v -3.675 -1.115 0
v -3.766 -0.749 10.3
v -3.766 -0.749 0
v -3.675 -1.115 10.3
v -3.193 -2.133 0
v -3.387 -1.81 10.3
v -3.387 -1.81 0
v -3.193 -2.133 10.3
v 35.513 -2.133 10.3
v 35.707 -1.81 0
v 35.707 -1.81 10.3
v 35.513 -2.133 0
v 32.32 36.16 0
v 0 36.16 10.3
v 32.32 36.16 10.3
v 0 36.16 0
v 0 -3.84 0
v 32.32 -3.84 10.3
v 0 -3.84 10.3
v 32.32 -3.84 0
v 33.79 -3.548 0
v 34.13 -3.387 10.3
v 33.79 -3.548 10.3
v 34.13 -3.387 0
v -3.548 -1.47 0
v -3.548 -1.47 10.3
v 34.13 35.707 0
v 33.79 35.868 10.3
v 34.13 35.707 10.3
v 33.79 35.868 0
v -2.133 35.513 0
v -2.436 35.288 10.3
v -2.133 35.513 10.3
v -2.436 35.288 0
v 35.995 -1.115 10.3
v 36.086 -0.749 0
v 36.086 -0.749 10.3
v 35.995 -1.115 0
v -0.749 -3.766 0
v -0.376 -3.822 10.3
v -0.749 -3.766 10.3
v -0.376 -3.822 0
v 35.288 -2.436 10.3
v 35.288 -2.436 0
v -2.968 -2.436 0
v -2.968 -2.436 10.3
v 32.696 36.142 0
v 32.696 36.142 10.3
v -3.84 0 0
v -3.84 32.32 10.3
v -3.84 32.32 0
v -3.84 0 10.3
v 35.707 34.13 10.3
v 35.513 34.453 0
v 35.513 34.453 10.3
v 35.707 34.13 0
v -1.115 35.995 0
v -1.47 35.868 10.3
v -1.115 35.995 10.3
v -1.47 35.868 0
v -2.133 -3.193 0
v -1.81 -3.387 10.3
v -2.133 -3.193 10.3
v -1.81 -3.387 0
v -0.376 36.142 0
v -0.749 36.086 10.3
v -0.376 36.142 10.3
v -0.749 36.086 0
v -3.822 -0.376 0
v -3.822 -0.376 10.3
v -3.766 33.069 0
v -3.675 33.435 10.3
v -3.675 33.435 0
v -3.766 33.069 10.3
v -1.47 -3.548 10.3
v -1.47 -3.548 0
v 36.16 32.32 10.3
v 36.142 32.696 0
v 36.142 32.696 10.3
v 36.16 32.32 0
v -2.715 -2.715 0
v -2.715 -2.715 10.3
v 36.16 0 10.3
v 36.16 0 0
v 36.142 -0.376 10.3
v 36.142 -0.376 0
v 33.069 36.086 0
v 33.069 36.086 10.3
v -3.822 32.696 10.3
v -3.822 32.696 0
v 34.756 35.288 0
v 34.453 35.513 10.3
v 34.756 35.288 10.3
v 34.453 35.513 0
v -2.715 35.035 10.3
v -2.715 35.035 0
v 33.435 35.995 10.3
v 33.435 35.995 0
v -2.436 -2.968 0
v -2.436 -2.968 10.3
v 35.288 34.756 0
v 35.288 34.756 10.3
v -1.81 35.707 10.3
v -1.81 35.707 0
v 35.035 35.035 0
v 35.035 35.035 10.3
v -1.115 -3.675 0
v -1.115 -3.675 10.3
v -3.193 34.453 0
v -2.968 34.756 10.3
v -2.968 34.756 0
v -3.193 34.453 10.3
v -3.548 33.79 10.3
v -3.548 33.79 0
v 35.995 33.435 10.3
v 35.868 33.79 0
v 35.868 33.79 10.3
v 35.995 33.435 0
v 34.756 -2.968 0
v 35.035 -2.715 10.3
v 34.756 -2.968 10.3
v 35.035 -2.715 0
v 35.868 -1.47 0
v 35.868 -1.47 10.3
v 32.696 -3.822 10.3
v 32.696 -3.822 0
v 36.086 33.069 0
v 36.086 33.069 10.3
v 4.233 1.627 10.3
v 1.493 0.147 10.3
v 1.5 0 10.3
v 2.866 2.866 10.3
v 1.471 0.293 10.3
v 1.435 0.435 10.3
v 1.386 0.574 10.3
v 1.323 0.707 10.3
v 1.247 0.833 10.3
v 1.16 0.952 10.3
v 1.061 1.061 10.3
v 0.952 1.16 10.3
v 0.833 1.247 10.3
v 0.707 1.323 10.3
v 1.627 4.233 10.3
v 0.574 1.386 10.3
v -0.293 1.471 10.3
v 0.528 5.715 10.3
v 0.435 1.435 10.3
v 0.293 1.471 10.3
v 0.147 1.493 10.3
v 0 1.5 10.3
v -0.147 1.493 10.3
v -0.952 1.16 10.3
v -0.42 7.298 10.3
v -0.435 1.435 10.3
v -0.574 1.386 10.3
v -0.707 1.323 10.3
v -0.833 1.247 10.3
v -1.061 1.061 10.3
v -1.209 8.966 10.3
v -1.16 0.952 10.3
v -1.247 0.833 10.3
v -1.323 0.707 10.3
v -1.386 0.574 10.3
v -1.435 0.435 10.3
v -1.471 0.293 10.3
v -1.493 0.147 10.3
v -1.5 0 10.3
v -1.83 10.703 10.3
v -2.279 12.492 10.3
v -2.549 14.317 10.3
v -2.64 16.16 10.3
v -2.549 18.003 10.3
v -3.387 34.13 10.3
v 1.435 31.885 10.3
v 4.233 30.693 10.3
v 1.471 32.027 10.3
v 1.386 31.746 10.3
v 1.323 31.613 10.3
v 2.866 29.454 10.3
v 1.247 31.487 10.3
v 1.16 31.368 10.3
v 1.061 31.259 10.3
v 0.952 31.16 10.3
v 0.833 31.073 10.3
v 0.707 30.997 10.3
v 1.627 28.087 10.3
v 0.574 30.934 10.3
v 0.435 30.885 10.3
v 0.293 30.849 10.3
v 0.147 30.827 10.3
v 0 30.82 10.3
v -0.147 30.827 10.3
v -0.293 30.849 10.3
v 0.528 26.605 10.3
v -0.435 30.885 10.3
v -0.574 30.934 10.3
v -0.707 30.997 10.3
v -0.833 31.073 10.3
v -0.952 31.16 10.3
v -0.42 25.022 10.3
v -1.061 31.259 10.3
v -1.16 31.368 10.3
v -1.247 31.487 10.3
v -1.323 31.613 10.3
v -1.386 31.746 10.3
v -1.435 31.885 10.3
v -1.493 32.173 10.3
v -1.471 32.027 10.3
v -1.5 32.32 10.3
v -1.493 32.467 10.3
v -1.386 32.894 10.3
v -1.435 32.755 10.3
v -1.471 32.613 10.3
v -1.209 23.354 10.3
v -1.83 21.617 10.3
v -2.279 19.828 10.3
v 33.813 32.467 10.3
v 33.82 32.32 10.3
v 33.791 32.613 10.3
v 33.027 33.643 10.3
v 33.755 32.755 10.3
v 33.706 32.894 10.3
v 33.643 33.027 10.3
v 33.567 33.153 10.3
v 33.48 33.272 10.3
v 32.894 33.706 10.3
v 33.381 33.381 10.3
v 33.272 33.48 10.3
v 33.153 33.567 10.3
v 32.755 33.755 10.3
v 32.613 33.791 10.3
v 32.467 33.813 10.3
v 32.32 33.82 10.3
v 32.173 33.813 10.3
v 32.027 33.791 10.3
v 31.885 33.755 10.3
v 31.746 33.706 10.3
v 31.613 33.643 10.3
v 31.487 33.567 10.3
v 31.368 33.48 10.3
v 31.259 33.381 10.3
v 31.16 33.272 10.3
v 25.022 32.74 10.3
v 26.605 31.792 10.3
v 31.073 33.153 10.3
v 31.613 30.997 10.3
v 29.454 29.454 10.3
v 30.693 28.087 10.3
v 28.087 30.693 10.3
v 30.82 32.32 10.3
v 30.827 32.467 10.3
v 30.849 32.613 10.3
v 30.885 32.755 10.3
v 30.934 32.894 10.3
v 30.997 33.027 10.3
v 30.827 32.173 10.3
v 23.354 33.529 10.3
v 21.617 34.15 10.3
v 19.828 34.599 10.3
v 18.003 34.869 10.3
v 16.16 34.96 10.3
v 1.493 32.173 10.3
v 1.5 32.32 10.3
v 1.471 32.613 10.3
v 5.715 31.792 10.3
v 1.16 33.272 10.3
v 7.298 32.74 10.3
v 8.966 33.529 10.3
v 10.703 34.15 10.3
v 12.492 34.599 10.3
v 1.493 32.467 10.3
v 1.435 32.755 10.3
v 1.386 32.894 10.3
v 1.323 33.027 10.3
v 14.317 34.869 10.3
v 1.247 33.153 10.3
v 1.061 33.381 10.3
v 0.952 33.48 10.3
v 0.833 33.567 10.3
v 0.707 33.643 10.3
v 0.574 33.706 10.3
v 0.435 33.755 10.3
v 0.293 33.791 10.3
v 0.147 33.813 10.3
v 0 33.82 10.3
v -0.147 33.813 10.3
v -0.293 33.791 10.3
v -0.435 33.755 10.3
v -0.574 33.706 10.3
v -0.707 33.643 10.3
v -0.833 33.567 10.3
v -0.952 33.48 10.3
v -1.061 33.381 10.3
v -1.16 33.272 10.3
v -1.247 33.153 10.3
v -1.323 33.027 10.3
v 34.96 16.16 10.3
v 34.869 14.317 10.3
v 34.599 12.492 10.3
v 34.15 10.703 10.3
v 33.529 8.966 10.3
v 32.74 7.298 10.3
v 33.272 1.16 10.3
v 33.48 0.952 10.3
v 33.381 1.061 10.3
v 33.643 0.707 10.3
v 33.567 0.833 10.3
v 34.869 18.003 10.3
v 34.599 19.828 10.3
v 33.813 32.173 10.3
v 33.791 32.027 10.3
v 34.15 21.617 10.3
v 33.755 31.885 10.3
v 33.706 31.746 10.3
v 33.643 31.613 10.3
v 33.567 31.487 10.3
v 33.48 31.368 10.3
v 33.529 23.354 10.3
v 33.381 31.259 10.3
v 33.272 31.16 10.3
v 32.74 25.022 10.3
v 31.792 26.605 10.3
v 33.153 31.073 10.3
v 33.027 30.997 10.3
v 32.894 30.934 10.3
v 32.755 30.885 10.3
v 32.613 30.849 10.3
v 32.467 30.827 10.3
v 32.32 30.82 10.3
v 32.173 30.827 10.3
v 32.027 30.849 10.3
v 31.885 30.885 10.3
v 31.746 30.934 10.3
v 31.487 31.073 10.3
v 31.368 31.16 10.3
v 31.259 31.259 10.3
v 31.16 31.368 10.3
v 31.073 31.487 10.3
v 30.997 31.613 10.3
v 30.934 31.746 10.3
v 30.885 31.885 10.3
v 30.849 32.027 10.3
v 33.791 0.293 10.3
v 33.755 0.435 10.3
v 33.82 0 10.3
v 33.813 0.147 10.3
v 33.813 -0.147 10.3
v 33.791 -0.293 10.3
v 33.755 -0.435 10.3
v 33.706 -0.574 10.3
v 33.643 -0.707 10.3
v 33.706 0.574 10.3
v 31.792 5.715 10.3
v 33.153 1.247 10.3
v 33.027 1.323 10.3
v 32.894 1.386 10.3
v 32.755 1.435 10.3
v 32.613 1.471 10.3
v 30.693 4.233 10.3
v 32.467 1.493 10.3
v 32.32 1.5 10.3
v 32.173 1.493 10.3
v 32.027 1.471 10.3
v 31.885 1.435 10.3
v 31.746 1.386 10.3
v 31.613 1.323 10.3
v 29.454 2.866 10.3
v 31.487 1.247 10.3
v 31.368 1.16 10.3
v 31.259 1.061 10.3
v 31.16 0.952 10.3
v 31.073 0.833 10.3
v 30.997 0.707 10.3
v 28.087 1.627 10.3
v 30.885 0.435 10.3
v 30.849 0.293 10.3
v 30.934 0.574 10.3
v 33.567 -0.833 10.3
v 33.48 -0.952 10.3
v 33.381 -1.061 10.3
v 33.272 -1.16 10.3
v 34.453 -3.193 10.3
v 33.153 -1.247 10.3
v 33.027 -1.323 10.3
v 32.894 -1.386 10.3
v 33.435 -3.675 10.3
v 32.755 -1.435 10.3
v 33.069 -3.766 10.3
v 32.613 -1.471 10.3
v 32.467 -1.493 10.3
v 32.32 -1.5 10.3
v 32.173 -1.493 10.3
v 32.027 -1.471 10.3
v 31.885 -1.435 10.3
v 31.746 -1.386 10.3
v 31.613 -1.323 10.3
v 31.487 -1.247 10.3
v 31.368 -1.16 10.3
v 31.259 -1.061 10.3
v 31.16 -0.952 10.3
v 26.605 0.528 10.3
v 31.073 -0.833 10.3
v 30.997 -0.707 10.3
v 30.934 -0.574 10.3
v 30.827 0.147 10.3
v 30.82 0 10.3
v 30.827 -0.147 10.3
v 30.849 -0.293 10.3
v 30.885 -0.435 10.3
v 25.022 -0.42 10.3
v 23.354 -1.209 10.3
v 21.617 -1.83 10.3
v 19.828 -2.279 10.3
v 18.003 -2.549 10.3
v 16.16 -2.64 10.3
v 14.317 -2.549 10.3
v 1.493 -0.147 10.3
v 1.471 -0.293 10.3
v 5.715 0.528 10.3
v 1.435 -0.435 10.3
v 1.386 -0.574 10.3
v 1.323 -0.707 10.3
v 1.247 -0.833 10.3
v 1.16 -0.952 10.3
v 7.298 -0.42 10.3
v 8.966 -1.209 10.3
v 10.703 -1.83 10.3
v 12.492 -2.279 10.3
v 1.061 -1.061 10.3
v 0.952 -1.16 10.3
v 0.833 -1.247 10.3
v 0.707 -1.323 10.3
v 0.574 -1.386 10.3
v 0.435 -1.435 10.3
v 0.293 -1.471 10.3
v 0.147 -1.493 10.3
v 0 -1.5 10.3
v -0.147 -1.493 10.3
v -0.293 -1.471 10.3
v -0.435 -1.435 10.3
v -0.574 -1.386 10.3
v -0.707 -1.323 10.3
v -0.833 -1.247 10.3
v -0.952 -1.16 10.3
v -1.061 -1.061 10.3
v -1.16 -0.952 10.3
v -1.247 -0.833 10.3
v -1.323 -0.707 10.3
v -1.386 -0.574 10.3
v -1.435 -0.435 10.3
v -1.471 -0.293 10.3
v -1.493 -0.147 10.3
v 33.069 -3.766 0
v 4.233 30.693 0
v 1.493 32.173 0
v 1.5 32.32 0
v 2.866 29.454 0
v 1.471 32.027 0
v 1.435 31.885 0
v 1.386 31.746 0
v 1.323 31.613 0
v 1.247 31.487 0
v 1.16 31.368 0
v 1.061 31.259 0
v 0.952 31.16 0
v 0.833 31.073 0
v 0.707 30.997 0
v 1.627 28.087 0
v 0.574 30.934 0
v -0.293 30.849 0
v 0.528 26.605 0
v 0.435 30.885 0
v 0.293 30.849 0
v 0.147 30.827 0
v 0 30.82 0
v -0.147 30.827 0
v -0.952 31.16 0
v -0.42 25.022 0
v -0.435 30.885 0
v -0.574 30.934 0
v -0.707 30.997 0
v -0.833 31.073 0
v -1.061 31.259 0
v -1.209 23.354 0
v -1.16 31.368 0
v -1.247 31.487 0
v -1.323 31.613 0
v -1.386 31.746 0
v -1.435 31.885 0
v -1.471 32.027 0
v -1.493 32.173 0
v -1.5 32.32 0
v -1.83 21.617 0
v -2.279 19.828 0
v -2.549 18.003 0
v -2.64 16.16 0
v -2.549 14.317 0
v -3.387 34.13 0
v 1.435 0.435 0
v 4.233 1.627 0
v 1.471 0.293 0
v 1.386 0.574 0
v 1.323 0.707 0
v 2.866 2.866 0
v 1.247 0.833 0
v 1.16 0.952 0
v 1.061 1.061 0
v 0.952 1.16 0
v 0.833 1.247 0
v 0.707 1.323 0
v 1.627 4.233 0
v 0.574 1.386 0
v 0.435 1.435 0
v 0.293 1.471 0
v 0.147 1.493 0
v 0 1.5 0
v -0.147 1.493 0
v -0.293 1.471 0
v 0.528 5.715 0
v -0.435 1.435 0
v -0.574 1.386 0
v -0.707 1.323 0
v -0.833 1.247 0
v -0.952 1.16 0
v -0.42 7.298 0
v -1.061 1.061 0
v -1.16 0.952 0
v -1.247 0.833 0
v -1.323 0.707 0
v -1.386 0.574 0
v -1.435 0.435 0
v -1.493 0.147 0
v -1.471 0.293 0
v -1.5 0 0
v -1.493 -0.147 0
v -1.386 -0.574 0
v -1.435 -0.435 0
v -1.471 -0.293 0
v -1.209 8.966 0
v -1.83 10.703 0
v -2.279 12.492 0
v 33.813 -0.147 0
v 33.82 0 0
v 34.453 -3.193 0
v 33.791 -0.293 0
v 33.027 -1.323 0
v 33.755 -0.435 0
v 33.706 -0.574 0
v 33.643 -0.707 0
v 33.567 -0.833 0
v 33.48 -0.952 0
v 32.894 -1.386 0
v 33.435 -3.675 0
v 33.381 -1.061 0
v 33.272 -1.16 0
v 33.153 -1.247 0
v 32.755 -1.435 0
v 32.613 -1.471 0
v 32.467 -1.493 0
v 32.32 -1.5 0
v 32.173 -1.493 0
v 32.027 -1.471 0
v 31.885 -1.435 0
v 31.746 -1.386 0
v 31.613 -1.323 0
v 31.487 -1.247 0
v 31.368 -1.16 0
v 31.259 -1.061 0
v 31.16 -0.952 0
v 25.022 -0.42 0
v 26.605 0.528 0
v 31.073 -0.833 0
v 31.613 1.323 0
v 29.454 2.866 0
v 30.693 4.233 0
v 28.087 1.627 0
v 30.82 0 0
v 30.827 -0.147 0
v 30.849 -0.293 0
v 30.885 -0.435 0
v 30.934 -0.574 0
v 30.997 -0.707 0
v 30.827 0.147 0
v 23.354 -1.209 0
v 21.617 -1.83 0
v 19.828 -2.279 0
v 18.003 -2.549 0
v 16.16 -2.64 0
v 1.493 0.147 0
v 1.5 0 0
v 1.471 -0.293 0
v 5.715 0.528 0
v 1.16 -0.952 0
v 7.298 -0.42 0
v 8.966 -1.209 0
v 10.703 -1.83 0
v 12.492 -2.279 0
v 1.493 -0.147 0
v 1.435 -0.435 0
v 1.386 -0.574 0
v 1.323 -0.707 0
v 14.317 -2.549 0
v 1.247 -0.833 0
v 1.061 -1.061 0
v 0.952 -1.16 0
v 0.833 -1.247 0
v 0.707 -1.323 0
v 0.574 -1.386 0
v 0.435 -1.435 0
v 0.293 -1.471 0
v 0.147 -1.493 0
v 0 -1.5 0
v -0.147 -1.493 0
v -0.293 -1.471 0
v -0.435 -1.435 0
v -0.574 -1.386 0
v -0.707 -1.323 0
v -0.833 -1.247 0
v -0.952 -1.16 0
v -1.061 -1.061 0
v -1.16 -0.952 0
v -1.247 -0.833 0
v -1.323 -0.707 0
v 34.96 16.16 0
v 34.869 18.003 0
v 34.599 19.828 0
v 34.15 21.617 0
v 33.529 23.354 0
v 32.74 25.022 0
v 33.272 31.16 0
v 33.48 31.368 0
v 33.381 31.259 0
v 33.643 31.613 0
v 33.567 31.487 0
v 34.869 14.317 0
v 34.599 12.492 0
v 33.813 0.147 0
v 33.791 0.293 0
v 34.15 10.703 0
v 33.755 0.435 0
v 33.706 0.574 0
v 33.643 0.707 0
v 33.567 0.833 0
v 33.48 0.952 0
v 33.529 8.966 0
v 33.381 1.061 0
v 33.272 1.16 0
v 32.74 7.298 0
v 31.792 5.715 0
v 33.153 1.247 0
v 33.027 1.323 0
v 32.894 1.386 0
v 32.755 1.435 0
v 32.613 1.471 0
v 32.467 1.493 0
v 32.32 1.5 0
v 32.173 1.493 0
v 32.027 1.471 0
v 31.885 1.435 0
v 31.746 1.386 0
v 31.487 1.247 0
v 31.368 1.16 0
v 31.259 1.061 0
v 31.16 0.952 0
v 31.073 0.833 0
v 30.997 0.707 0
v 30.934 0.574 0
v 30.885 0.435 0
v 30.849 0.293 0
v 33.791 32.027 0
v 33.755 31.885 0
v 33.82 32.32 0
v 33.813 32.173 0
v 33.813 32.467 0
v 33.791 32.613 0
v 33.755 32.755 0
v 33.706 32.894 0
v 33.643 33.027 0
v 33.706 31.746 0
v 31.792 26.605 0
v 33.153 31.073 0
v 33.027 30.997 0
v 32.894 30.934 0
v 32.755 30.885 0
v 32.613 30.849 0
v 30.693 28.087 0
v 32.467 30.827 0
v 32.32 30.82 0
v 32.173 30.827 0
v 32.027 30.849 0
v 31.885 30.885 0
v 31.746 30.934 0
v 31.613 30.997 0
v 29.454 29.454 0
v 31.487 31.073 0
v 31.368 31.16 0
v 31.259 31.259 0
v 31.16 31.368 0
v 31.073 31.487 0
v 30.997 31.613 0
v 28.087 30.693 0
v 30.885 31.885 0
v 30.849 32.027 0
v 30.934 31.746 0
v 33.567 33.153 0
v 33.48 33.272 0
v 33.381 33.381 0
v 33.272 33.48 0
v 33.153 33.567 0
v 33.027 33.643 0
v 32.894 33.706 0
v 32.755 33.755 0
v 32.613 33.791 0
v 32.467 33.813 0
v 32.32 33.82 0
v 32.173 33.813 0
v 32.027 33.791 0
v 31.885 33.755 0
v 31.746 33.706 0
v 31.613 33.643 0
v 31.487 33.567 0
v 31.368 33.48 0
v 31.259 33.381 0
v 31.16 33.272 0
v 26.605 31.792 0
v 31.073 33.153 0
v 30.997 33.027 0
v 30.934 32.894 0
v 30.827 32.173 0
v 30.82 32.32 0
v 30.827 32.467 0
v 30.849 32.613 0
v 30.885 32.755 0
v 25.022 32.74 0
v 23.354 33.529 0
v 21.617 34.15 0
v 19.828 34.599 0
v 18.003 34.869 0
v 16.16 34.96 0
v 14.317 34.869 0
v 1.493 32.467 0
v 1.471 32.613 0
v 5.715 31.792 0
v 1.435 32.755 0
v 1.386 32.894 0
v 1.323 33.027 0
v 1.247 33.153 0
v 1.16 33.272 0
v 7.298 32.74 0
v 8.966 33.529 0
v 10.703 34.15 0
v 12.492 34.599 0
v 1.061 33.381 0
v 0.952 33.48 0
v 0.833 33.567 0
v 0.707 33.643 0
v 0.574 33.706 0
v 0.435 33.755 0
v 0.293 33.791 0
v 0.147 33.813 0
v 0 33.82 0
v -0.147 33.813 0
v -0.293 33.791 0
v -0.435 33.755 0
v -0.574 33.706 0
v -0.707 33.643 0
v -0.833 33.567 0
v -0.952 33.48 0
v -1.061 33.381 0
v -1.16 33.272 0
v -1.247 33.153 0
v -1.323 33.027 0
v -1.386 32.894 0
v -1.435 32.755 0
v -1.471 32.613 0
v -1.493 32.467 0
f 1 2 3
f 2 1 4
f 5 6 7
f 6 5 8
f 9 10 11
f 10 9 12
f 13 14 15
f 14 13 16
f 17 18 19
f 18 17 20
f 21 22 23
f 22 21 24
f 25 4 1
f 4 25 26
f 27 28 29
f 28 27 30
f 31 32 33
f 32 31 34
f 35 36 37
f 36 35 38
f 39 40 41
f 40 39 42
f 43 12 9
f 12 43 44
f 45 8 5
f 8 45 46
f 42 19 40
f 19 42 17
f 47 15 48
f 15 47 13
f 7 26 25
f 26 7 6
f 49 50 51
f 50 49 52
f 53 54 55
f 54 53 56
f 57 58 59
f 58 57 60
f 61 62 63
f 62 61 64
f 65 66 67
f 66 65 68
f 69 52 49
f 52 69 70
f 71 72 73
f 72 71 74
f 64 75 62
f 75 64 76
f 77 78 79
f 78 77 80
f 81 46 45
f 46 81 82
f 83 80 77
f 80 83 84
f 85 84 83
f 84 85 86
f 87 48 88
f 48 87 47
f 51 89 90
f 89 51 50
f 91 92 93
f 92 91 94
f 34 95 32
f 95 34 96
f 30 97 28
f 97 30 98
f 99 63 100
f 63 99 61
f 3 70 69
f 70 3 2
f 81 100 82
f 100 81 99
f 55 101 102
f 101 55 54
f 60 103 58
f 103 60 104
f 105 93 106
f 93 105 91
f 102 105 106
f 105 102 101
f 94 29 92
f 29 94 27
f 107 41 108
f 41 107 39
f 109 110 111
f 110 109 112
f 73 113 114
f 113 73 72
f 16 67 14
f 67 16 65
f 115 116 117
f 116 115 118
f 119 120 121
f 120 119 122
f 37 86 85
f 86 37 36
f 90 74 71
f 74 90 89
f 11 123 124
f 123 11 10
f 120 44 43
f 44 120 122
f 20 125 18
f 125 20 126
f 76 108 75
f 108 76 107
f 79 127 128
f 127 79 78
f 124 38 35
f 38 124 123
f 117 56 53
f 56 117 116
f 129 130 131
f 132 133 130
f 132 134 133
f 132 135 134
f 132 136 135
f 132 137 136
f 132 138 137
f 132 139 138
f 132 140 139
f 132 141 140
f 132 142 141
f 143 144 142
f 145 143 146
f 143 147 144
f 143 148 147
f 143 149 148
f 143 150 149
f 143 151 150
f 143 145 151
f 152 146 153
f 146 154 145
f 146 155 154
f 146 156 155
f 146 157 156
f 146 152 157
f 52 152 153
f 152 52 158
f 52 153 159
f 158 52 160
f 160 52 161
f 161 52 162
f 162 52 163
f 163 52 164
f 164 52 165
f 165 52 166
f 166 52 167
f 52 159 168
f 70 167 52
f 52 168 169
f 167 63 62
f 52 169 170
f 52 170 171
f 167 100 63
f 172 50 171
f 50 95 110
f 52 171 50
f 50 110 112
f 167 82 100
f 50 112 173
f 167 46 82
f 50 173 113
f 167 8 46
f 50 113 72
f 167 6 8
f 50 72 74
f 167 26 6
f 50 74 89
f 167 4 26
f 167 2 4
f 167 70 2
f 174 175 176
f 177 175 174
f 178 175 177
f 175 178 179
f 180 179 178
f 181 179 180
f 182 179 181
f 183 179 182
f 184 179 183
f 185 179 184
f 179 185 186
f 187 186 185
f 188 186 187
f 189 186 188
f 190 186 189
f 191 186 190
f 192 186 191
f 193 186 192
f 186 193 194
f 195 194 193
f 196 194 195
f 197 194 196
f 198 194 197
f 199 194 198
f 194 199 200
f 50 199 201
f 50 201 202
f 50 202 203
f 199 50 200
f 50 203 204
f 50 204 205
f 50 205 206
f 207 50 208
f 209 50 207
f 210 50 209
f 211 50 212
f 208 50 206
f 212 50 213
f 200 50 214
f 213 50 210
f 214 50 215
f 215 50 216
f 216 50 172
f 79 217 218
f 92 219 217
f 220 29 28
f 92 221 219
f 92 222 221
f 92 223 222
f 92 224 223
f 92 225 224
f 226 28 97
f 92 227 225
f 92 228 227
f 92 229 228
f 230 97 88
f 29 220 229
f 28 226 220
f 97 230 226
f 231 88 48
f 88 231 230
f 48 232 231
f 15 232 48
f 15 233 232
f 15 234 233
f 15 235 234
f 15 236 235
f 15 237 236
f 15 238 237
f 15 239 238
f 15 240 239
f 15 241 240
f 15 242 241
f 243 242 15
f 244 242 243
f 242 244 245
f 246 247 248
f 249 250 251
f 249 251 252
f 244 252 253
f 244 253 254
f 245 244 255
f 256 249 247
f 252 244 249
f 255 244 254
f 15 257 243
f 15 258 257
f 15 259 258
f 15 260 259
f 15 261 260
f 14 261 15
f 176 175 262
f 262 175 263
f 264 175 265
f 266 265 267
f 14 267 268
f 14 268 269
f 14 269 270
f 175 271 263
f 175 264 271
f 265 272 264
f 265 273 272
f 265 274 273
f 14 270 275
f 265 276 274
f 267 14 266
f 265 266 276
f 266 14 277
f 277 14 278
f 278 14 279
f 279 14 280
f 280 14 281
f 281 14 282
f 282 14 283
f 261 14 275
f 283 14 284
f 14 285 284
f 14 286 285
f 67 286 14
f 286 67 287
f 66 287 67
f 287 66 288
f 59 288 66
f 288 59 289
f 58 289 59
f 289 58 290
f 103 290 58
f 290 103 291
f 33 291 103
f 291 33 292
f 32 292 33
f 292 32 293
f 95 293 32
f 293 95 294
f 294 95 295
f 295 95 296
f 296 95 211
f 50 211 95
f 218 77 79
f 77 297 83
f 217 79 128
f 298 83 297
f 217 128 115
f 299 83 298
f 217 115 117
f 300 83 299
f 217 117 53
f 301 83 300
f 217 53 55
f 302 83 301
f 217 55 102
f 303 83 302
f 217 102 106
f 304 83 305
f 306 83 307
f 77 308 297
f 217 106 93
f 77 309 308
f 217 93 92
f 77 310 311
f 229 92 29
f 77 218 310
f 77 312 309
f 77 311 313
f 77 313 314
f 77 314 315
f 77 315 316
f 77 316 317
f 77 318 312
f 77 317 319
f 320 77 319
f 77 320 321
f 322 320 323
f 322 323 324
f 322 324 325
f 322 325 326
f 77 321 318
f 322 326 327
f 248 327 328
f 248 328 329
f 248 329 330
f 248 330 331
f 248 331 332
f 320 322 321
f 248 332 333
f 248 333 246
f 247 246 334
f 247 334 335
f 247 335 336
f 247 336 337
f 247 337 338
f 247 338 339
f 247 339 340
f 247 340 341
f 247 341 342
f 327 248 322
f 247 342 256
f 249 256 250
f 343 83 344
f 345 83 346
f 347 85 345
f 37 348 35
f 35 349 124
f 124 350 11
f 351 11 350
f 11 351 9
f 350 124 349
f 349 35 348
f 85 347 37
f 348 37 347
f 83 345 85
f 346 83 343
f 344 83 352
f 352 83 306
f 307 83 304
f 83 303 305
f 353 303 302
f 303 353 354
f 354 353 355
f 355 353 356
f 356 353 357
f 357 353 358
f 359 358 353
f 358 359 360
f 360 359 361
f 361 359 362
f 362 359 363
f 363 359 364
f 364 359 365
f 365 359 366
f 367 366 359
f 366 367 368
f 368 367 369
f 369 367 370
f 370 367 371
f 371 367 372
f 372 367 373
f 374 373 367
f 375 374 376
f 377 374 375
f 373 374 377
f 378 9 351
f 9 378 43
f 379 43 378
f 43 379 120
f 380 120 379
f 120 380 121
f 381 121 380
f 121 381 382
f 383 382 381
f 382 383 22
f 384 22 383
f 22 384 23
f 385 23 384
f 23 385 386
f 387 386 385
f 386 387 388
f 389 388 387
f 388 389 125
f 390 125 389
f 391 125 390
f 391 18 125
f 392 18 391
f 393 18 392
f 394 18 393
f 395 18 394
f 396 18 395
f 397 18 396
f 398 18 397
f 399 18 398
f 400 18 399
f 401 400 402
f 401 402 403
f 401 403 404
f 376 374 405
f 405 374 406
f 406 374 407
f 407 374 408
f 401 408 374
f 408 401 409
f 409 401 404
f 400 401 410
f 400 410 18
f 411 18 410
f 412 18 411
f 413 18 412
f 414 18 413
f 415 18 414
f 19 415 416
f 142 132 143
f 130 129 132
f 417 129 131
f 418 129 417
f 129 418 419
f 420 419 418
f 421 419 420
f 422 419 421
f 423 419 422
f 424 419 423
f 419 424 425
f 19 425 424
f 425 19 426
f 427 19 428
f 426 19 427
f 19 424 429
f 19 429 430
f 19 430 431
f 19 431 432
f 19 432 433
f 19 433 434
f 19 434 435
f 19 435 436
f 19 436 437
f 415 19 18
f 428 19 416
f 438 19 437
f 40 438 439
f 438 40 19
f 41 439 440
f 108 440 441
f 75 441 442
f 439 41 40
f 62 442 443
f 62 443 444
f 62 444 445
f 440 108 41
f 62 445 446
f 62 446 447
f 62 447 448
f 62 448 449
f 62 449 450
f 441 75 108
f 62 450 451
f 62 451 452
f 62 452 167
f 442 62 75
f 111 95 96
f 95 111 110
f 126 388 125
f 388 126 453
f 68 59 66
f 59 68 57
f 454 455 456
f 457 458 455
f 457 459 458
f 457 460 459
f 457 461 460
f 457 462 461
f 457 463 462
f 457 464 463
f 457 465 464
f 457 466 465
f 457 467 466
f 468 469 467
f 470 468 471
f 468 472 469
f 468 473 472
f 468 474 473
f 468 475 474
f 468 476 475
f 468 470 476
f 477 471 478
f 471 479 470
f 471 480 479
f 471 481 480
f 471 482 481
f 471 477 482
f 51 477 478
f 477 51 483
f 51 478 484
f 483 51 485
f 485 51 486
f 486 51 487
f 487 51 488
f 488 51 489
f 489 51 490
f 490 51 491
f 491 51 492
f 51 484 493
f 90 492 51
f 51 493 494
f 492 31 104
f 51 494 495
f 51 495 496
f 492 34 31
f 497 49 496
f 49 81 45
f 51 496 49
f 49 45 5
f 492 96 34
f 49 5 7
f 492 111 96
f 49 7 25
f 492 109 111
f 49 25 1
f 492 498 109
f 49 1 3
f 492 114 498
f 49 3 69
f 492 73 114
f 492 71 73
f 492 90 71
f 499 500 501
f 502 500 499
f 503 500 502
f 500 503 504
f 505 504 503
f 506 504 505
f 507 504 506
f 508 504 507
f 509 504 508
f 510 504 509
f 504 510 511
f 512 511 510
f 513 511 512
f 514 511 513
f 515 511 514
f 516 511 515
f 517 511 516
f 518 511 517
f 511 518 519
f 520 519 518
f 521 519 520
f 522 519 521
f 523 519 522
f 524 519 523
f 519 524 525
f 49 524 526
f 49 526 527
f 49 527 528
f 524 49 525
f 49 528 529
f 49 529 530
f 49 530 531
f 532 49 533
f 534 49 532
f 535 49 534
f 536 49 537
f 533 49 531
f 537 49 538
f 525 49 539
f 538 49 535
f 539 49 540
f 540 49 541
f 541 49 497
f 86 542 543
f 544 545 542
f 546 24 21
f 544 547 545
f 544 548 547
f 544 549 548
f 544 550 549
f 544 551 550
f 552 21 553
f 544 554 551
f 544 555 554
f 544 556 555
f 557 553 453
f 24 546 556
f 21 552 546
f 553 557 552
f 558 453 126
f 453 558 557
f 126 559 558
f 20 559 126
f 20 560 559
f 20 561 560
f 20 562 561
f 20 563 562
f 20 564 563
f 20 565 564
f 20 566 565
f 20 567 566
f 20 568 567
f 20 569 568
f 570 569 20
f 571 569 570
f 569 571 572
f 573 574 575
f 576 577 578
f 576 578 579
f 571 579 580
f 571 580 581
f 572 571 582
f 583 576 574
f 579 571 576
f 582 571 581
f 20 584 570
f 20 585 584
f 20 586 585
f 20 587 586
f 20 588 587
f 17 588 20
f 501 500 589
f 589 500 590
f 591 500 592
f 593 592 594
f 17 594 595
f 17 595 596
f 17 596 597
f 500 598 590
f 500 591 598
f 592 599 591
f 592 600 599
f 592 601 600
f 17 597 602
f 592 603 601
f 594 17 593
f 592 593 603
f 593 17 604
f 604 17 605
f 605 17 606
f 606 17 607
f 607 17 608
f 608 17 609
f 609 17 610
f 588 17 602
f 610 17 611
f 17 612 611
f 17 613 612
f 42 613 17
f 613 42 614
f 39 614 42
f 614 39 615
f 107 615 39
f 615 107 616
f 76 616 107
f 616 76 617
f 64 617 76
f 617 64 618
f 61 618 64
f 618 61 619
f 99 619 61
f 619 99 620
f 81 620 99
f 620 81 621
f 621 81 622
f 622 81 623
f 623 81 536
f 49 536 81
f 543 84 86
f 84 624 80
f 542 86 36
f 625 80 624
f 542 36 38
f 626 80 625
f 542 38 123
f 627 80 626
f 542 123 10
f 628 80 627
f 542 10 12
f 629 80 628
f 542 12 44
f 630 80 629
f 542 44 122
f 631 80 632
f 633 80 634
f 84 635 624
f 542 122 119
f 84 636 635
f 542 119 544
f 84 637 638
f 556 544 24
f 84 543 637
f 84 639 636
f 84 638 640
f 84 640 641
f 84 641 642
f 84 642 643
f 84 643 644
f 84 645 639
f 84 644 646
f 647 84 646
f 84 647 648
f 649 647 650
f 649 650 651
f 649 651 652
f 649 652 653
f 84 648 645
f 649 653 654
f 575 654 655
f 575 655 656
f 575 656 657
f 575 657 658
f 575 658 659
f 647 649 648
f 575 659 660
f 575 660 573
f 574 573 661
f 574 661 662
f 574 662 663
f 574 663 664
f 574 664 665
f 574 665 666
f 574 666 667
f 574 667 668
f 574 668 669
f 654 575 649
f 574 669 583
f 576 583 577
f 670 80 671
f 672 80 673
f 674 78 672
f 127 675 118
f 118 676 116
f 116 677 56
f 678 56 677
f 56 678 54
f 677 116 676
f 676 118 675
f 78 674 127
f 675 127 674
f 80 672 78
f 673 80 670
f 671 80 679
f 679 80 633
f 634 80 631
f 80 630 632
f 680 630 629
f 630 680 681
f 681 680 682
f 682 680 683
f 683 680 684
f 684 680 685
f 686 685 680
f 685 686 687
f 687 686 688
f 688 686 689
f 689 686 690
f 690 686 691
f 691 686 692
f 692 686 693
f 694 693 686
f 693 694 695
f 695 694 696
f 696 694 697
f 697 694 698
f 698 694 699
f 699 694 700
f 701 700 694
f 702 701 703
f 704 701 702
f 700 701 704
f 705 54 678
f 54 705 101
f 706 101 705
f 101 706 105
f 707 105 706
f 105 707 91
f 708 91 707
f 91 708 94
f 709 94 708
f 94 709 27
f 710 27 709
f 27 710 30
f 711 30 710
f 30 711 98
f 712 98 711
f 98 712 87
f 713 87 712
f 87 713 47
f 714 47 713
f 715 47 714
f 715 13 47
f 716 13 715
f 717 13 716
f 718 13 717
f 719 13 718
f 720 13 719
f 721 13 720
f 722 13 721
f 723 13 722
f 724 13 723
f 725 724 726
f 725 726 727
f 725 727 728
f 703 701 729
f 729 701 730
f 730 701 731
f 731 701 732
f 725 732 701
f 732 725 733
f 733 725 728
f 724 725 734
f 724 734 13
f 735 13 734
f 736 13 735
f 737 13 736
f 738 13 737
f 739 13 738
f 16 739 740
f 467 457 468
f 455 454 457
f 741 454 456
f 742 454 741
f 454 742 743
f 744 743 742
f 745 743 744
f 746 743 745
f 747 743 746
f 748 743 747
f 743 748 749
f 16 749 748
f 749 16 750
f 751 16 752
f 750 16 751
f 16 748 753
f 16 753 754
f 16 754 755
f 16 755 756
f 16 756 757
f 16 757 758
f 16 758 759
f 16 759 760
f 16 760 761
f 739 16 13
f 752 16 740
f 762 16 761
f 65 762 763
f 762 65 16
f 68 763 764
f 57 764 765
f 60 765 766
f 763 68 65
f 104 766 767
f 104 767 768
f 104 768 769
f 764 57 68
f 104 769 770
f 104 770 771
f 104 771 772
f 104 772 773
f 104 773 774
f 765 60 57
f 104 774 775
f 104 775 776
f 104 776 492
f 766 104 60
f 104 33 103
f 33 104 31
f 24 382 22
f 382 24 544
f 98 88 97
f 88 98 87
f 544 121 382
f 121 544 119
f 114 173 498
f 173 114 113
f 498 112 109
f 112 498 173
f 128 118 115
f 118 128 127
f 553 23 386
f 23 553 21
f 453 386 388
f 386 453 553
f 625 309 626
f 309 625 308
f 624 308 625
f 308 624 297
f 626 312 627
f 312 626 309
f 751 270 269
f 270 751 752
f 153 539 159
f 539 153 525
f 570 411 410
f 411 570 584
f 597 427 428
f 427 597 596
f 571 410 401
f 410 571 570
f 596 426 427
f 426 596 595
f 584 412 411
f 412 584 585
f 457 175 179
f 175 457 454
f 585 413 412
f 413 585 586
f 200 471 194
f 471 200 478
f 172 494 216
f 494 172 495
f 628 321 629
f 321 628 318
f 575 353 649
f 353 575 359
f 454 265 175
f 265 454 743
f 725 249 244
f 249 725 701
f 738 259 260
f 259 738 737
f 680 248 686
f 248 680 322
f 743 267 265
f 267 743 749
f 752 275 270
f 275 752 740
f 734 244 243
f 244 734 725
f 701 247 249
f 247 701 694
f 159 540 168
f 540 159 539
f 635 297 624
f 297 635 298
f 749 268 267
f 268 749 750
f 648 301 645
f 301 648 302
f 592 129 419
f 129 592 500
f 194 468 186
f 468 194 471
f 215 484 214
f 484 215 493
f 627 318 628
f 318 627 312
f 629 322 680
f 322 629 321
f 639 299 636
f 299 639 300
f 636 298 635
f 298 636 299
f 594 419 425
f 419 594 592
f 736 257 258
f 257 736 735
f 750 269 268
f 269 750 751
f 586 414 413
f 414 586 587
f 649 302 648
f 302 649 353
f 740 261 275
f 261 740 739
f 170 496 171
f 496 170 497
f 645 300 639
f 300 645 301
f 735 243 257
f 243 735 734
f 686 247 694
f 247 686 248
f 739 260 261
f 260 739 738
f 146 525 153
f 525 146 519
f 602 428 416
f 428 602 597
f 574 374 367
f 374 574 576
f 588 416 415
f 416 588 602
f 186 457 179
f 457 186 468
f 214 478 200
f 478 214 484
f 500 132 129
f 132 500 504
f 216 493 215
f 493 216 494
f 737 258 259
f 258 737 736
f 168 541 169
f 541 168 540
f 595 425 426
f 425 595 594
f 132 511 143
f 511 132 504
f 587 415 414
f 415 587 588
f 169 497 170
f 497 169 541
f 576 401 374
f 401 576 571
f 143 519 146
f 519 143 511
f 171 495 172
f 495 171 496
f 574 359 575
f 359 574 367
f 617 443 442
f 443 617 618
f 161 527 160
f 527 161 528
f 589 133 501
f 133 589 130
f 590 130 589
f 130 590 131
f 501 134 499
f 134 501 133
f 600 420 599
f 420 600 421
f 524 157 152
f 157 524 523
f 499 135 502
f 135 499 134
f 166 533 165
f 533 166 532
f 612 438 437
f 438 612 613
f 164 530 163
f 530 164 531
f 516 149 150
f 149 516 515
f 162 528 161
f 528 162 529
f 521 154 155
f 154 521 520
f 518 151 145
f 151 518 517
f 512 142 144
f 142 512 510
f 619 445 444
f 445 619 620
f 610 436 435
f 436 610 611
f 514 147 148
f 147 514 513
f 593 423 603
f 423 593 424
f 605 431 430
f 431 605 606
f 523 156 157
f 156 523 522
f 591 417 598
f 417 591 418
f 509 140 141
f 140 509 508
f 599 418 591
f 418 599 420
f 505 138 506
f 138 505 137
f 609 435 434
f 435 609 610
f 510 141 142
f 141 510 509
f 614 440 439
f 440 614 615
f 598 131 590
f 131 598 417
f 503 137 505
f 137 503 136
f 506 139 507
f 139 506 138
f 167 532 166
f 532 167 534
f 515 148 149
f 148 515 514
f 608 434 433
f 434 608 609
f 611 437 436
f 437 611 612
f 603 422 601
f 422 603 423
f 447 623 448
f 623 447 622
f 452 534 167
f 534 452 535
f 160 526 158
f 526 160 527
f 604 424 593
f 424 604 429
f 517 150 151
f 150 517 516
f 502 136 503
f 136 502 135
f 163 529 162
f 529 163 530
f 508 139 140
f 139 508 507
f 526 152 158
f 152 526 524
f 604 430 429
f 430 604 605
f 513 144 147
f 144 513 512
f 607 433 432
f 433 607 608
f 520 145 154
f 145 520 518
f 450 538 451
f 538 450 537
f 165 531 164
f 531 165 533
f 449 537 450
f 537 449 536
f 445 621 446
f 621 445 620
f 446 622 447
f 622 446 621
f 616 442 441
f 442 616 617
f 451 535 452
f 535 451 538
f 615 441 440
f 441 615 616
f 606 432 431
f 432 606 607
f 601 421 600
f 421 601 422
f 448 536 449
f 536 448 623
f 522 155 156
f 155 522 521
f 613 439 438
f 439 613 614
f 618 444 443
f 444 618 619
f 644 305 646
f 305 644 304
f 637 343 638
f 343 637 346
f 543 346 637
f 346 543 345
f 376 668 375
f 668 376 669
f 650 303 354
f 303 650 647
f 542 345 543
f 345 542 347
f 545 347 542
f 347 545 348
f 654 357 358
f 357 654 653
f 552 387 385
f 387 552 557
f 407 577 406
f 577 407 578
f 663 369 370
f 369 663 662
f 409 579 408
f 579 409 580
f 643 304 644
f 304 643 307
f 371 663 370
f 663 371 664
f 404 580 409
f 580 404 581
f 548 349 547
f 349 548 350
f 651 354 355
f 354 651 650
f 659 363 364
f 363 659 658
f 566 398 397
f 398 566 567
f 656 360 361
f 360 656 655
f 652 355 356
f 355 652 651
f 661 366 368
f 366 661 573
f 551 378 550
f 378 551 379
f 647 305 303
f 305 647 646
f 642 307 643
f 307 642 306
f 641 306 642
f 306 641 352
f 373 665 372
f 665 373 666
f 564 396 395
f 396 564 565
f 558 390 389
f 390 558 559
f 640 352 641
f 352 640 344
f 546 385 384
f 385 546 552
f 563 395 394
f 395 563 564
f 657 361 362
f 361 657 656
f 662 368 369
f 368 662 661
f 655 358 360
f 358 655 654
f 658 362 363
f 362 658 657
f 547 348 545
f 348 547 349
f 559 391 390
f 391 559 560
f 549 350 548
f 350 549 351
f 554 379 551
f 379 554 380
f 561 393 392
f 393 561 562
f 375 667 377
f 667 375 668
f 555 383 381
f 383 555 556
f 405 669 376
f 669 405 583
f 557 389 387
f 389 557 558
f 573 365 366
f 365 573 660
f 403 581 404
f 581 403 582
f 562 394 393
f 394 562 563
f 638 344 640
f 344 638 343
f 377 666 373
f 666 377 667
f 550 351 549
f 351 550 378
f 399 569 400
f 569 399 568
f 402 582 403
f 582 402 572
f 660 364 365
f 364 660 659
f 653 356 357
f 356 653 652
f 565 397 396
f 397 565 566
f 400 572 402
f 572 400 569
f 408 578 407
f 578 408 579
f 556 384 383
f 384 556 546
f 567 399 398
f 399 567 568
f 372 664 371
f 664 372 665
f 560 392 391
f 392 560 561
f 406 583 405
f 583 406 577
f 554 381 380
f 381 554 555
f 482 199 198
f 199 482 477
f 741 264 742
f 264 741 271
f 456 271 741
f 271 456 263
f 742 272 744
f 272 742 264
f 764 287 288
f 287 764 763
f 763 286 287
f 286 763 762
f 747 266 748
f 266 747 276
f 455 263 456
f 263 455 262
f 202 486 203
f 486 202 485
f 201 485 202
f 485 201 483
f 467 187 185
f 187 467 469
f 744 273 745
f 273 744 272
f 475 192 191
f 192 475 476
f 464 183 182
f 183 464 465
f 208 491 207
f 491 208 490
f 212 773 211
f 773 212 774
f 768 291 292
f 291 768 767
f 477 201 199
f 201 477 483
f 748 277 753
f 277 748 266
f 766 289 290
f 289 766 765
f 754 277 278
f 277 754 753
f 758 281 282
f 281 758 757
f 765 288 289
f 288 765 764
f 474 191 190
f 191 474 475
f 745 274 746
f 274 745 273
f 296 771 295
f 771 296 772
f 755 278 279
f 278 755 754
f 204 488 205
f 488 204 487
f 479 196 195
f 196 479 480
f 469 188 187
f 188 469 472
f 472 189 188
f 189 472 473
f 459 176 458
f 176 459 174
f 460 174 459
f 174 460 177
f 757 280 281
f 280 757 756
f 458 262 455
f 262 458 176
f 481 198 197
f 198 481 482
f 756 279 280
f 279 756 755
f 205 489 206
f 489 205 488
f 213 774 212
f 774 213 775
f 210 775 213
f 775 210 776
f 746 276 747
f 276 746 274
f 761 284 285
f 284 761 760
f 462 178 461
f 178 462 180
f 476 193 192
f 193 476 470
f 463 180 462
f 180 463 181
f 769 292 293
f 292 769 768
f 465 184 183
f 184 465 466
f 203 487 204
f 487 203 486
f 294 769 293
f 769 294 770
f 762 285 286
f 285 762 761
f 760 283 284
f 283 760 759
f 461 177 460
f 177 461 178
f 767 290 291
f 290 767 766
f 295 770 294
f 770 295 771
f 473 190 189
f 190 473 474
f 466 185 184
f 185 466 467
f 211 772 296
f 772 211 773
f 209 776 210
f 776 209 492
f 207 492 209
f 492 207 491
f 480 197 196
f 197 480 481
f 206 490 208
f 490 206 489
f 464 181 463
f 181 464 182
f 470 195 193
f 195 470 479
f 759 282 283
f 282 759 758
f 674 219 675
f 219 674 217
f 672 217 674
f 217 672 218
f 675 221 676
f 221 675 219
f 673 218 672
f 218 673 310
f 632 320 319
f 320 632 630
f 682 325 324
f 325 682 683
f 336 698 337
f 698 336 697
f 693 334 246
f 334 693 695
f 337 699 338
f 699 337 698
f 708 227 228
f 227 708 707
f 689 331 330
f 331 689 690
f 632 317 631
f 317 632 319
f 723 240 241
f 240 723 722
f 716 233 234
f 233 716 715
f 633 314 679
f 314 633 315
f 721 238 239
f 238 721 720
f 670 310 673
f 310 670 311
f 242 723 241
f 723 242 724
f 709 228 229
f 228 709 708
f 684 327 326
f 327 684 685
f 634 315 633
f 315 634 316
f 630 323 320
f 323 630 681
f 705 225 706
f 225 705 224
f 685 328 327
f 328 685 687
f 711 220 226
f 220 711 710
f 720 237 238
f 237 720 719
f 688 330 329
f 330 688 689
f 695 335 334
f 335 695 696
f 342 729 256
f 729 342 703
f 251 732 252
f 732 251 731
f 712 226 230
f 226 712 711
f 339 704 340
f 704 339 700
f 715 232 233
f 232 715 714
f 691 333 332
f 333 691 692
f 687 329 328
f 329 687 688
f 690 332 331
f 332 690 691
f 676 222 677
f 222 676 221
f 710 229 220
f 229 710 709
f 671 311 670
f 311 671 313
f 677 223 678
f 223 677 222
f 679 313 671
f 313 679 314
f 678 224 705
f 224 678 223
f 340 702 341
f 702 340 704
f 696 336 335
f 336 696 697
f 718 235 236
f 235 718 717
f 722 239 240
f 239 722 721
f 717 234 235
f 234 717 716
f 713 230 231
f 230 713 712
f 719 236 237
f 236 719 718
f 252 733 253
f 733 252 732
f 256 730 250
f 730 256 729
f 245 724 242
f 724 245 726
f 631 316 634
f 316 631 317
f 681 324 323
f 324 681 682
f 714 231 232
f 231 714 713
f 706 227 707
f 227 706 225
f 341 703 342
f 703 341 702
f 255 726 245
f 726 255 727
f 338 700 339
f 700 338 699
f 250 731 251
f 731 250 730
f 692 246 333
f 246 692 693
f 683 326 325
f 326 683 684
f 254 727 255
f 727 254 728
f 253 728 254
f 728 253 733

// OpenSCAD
// Dr.Gerg's Lil WeatherPi Vent Fan
// OpenSCAD definition file
// https://www.drgerg.com
// OpenSCAD Cheatsheet http://www.openscad.org/cheatsheet/index.html
//
// PARAMETER DEFINITIONS// PARAMETER DEFINITIONS
// 
wall = 1;  // how thick do you want the wall to be?
cornerDia = 7.68; // The diameter of the screw holes for the two pole contacts.
totLength = 40; // Total length of assembly.
totWidth = 40;  // Total width of assembly.
baseHt = 10.3; // Thickness of the fan only.
throat = 37.6; // diameter of fan.
screwR = 1.5; // radius of screw hole.

//
//// MAIN BODY OF BUILD
// COMPONENT BODY DEFINITION
//
module fanscrews(){
    translate([0,0,-19])
    cylinder(h=baseHt+20,r=screwR);
    translate([totLength-cornerDia,0,-19])
    cylinder(h=baseHt+20,r=screwR);
    translate([0,totWidth-cornerDia,-19])
    cylinder(h=baseHt+20,r=screwR);
    translate([totLength-cornerDia,totWidth-cornerDia,-19])
    cylinder(h=baseHt+20,r=screwR);
}
$fn=64;
module fanThroat(){
    translate([totLength/2-(cornerDia/2),totWidth/2-(cornerDia/2),-1])
    cylinder(h=baseHt+10,d=throat);
}


module fanFrame(){
        minkowski(){
        cube([totLength-cornerDia,totWidth-cornerDia,baseHt/2]);
        cylinder(baseHt/2,d=cornerDia);
        }
}


module fanbody(){
    union(){
        difference(){
                difference(){
                minkowski(){
                    cube([totLength-cornerDia,totWidth-cornerDia,baseHt/2]);
                    cylinder(baseHt/2,d=cornerDia);
                    }
                fanThroat();
                }
            fanscrews();
        }
    }
}
fanbody();
